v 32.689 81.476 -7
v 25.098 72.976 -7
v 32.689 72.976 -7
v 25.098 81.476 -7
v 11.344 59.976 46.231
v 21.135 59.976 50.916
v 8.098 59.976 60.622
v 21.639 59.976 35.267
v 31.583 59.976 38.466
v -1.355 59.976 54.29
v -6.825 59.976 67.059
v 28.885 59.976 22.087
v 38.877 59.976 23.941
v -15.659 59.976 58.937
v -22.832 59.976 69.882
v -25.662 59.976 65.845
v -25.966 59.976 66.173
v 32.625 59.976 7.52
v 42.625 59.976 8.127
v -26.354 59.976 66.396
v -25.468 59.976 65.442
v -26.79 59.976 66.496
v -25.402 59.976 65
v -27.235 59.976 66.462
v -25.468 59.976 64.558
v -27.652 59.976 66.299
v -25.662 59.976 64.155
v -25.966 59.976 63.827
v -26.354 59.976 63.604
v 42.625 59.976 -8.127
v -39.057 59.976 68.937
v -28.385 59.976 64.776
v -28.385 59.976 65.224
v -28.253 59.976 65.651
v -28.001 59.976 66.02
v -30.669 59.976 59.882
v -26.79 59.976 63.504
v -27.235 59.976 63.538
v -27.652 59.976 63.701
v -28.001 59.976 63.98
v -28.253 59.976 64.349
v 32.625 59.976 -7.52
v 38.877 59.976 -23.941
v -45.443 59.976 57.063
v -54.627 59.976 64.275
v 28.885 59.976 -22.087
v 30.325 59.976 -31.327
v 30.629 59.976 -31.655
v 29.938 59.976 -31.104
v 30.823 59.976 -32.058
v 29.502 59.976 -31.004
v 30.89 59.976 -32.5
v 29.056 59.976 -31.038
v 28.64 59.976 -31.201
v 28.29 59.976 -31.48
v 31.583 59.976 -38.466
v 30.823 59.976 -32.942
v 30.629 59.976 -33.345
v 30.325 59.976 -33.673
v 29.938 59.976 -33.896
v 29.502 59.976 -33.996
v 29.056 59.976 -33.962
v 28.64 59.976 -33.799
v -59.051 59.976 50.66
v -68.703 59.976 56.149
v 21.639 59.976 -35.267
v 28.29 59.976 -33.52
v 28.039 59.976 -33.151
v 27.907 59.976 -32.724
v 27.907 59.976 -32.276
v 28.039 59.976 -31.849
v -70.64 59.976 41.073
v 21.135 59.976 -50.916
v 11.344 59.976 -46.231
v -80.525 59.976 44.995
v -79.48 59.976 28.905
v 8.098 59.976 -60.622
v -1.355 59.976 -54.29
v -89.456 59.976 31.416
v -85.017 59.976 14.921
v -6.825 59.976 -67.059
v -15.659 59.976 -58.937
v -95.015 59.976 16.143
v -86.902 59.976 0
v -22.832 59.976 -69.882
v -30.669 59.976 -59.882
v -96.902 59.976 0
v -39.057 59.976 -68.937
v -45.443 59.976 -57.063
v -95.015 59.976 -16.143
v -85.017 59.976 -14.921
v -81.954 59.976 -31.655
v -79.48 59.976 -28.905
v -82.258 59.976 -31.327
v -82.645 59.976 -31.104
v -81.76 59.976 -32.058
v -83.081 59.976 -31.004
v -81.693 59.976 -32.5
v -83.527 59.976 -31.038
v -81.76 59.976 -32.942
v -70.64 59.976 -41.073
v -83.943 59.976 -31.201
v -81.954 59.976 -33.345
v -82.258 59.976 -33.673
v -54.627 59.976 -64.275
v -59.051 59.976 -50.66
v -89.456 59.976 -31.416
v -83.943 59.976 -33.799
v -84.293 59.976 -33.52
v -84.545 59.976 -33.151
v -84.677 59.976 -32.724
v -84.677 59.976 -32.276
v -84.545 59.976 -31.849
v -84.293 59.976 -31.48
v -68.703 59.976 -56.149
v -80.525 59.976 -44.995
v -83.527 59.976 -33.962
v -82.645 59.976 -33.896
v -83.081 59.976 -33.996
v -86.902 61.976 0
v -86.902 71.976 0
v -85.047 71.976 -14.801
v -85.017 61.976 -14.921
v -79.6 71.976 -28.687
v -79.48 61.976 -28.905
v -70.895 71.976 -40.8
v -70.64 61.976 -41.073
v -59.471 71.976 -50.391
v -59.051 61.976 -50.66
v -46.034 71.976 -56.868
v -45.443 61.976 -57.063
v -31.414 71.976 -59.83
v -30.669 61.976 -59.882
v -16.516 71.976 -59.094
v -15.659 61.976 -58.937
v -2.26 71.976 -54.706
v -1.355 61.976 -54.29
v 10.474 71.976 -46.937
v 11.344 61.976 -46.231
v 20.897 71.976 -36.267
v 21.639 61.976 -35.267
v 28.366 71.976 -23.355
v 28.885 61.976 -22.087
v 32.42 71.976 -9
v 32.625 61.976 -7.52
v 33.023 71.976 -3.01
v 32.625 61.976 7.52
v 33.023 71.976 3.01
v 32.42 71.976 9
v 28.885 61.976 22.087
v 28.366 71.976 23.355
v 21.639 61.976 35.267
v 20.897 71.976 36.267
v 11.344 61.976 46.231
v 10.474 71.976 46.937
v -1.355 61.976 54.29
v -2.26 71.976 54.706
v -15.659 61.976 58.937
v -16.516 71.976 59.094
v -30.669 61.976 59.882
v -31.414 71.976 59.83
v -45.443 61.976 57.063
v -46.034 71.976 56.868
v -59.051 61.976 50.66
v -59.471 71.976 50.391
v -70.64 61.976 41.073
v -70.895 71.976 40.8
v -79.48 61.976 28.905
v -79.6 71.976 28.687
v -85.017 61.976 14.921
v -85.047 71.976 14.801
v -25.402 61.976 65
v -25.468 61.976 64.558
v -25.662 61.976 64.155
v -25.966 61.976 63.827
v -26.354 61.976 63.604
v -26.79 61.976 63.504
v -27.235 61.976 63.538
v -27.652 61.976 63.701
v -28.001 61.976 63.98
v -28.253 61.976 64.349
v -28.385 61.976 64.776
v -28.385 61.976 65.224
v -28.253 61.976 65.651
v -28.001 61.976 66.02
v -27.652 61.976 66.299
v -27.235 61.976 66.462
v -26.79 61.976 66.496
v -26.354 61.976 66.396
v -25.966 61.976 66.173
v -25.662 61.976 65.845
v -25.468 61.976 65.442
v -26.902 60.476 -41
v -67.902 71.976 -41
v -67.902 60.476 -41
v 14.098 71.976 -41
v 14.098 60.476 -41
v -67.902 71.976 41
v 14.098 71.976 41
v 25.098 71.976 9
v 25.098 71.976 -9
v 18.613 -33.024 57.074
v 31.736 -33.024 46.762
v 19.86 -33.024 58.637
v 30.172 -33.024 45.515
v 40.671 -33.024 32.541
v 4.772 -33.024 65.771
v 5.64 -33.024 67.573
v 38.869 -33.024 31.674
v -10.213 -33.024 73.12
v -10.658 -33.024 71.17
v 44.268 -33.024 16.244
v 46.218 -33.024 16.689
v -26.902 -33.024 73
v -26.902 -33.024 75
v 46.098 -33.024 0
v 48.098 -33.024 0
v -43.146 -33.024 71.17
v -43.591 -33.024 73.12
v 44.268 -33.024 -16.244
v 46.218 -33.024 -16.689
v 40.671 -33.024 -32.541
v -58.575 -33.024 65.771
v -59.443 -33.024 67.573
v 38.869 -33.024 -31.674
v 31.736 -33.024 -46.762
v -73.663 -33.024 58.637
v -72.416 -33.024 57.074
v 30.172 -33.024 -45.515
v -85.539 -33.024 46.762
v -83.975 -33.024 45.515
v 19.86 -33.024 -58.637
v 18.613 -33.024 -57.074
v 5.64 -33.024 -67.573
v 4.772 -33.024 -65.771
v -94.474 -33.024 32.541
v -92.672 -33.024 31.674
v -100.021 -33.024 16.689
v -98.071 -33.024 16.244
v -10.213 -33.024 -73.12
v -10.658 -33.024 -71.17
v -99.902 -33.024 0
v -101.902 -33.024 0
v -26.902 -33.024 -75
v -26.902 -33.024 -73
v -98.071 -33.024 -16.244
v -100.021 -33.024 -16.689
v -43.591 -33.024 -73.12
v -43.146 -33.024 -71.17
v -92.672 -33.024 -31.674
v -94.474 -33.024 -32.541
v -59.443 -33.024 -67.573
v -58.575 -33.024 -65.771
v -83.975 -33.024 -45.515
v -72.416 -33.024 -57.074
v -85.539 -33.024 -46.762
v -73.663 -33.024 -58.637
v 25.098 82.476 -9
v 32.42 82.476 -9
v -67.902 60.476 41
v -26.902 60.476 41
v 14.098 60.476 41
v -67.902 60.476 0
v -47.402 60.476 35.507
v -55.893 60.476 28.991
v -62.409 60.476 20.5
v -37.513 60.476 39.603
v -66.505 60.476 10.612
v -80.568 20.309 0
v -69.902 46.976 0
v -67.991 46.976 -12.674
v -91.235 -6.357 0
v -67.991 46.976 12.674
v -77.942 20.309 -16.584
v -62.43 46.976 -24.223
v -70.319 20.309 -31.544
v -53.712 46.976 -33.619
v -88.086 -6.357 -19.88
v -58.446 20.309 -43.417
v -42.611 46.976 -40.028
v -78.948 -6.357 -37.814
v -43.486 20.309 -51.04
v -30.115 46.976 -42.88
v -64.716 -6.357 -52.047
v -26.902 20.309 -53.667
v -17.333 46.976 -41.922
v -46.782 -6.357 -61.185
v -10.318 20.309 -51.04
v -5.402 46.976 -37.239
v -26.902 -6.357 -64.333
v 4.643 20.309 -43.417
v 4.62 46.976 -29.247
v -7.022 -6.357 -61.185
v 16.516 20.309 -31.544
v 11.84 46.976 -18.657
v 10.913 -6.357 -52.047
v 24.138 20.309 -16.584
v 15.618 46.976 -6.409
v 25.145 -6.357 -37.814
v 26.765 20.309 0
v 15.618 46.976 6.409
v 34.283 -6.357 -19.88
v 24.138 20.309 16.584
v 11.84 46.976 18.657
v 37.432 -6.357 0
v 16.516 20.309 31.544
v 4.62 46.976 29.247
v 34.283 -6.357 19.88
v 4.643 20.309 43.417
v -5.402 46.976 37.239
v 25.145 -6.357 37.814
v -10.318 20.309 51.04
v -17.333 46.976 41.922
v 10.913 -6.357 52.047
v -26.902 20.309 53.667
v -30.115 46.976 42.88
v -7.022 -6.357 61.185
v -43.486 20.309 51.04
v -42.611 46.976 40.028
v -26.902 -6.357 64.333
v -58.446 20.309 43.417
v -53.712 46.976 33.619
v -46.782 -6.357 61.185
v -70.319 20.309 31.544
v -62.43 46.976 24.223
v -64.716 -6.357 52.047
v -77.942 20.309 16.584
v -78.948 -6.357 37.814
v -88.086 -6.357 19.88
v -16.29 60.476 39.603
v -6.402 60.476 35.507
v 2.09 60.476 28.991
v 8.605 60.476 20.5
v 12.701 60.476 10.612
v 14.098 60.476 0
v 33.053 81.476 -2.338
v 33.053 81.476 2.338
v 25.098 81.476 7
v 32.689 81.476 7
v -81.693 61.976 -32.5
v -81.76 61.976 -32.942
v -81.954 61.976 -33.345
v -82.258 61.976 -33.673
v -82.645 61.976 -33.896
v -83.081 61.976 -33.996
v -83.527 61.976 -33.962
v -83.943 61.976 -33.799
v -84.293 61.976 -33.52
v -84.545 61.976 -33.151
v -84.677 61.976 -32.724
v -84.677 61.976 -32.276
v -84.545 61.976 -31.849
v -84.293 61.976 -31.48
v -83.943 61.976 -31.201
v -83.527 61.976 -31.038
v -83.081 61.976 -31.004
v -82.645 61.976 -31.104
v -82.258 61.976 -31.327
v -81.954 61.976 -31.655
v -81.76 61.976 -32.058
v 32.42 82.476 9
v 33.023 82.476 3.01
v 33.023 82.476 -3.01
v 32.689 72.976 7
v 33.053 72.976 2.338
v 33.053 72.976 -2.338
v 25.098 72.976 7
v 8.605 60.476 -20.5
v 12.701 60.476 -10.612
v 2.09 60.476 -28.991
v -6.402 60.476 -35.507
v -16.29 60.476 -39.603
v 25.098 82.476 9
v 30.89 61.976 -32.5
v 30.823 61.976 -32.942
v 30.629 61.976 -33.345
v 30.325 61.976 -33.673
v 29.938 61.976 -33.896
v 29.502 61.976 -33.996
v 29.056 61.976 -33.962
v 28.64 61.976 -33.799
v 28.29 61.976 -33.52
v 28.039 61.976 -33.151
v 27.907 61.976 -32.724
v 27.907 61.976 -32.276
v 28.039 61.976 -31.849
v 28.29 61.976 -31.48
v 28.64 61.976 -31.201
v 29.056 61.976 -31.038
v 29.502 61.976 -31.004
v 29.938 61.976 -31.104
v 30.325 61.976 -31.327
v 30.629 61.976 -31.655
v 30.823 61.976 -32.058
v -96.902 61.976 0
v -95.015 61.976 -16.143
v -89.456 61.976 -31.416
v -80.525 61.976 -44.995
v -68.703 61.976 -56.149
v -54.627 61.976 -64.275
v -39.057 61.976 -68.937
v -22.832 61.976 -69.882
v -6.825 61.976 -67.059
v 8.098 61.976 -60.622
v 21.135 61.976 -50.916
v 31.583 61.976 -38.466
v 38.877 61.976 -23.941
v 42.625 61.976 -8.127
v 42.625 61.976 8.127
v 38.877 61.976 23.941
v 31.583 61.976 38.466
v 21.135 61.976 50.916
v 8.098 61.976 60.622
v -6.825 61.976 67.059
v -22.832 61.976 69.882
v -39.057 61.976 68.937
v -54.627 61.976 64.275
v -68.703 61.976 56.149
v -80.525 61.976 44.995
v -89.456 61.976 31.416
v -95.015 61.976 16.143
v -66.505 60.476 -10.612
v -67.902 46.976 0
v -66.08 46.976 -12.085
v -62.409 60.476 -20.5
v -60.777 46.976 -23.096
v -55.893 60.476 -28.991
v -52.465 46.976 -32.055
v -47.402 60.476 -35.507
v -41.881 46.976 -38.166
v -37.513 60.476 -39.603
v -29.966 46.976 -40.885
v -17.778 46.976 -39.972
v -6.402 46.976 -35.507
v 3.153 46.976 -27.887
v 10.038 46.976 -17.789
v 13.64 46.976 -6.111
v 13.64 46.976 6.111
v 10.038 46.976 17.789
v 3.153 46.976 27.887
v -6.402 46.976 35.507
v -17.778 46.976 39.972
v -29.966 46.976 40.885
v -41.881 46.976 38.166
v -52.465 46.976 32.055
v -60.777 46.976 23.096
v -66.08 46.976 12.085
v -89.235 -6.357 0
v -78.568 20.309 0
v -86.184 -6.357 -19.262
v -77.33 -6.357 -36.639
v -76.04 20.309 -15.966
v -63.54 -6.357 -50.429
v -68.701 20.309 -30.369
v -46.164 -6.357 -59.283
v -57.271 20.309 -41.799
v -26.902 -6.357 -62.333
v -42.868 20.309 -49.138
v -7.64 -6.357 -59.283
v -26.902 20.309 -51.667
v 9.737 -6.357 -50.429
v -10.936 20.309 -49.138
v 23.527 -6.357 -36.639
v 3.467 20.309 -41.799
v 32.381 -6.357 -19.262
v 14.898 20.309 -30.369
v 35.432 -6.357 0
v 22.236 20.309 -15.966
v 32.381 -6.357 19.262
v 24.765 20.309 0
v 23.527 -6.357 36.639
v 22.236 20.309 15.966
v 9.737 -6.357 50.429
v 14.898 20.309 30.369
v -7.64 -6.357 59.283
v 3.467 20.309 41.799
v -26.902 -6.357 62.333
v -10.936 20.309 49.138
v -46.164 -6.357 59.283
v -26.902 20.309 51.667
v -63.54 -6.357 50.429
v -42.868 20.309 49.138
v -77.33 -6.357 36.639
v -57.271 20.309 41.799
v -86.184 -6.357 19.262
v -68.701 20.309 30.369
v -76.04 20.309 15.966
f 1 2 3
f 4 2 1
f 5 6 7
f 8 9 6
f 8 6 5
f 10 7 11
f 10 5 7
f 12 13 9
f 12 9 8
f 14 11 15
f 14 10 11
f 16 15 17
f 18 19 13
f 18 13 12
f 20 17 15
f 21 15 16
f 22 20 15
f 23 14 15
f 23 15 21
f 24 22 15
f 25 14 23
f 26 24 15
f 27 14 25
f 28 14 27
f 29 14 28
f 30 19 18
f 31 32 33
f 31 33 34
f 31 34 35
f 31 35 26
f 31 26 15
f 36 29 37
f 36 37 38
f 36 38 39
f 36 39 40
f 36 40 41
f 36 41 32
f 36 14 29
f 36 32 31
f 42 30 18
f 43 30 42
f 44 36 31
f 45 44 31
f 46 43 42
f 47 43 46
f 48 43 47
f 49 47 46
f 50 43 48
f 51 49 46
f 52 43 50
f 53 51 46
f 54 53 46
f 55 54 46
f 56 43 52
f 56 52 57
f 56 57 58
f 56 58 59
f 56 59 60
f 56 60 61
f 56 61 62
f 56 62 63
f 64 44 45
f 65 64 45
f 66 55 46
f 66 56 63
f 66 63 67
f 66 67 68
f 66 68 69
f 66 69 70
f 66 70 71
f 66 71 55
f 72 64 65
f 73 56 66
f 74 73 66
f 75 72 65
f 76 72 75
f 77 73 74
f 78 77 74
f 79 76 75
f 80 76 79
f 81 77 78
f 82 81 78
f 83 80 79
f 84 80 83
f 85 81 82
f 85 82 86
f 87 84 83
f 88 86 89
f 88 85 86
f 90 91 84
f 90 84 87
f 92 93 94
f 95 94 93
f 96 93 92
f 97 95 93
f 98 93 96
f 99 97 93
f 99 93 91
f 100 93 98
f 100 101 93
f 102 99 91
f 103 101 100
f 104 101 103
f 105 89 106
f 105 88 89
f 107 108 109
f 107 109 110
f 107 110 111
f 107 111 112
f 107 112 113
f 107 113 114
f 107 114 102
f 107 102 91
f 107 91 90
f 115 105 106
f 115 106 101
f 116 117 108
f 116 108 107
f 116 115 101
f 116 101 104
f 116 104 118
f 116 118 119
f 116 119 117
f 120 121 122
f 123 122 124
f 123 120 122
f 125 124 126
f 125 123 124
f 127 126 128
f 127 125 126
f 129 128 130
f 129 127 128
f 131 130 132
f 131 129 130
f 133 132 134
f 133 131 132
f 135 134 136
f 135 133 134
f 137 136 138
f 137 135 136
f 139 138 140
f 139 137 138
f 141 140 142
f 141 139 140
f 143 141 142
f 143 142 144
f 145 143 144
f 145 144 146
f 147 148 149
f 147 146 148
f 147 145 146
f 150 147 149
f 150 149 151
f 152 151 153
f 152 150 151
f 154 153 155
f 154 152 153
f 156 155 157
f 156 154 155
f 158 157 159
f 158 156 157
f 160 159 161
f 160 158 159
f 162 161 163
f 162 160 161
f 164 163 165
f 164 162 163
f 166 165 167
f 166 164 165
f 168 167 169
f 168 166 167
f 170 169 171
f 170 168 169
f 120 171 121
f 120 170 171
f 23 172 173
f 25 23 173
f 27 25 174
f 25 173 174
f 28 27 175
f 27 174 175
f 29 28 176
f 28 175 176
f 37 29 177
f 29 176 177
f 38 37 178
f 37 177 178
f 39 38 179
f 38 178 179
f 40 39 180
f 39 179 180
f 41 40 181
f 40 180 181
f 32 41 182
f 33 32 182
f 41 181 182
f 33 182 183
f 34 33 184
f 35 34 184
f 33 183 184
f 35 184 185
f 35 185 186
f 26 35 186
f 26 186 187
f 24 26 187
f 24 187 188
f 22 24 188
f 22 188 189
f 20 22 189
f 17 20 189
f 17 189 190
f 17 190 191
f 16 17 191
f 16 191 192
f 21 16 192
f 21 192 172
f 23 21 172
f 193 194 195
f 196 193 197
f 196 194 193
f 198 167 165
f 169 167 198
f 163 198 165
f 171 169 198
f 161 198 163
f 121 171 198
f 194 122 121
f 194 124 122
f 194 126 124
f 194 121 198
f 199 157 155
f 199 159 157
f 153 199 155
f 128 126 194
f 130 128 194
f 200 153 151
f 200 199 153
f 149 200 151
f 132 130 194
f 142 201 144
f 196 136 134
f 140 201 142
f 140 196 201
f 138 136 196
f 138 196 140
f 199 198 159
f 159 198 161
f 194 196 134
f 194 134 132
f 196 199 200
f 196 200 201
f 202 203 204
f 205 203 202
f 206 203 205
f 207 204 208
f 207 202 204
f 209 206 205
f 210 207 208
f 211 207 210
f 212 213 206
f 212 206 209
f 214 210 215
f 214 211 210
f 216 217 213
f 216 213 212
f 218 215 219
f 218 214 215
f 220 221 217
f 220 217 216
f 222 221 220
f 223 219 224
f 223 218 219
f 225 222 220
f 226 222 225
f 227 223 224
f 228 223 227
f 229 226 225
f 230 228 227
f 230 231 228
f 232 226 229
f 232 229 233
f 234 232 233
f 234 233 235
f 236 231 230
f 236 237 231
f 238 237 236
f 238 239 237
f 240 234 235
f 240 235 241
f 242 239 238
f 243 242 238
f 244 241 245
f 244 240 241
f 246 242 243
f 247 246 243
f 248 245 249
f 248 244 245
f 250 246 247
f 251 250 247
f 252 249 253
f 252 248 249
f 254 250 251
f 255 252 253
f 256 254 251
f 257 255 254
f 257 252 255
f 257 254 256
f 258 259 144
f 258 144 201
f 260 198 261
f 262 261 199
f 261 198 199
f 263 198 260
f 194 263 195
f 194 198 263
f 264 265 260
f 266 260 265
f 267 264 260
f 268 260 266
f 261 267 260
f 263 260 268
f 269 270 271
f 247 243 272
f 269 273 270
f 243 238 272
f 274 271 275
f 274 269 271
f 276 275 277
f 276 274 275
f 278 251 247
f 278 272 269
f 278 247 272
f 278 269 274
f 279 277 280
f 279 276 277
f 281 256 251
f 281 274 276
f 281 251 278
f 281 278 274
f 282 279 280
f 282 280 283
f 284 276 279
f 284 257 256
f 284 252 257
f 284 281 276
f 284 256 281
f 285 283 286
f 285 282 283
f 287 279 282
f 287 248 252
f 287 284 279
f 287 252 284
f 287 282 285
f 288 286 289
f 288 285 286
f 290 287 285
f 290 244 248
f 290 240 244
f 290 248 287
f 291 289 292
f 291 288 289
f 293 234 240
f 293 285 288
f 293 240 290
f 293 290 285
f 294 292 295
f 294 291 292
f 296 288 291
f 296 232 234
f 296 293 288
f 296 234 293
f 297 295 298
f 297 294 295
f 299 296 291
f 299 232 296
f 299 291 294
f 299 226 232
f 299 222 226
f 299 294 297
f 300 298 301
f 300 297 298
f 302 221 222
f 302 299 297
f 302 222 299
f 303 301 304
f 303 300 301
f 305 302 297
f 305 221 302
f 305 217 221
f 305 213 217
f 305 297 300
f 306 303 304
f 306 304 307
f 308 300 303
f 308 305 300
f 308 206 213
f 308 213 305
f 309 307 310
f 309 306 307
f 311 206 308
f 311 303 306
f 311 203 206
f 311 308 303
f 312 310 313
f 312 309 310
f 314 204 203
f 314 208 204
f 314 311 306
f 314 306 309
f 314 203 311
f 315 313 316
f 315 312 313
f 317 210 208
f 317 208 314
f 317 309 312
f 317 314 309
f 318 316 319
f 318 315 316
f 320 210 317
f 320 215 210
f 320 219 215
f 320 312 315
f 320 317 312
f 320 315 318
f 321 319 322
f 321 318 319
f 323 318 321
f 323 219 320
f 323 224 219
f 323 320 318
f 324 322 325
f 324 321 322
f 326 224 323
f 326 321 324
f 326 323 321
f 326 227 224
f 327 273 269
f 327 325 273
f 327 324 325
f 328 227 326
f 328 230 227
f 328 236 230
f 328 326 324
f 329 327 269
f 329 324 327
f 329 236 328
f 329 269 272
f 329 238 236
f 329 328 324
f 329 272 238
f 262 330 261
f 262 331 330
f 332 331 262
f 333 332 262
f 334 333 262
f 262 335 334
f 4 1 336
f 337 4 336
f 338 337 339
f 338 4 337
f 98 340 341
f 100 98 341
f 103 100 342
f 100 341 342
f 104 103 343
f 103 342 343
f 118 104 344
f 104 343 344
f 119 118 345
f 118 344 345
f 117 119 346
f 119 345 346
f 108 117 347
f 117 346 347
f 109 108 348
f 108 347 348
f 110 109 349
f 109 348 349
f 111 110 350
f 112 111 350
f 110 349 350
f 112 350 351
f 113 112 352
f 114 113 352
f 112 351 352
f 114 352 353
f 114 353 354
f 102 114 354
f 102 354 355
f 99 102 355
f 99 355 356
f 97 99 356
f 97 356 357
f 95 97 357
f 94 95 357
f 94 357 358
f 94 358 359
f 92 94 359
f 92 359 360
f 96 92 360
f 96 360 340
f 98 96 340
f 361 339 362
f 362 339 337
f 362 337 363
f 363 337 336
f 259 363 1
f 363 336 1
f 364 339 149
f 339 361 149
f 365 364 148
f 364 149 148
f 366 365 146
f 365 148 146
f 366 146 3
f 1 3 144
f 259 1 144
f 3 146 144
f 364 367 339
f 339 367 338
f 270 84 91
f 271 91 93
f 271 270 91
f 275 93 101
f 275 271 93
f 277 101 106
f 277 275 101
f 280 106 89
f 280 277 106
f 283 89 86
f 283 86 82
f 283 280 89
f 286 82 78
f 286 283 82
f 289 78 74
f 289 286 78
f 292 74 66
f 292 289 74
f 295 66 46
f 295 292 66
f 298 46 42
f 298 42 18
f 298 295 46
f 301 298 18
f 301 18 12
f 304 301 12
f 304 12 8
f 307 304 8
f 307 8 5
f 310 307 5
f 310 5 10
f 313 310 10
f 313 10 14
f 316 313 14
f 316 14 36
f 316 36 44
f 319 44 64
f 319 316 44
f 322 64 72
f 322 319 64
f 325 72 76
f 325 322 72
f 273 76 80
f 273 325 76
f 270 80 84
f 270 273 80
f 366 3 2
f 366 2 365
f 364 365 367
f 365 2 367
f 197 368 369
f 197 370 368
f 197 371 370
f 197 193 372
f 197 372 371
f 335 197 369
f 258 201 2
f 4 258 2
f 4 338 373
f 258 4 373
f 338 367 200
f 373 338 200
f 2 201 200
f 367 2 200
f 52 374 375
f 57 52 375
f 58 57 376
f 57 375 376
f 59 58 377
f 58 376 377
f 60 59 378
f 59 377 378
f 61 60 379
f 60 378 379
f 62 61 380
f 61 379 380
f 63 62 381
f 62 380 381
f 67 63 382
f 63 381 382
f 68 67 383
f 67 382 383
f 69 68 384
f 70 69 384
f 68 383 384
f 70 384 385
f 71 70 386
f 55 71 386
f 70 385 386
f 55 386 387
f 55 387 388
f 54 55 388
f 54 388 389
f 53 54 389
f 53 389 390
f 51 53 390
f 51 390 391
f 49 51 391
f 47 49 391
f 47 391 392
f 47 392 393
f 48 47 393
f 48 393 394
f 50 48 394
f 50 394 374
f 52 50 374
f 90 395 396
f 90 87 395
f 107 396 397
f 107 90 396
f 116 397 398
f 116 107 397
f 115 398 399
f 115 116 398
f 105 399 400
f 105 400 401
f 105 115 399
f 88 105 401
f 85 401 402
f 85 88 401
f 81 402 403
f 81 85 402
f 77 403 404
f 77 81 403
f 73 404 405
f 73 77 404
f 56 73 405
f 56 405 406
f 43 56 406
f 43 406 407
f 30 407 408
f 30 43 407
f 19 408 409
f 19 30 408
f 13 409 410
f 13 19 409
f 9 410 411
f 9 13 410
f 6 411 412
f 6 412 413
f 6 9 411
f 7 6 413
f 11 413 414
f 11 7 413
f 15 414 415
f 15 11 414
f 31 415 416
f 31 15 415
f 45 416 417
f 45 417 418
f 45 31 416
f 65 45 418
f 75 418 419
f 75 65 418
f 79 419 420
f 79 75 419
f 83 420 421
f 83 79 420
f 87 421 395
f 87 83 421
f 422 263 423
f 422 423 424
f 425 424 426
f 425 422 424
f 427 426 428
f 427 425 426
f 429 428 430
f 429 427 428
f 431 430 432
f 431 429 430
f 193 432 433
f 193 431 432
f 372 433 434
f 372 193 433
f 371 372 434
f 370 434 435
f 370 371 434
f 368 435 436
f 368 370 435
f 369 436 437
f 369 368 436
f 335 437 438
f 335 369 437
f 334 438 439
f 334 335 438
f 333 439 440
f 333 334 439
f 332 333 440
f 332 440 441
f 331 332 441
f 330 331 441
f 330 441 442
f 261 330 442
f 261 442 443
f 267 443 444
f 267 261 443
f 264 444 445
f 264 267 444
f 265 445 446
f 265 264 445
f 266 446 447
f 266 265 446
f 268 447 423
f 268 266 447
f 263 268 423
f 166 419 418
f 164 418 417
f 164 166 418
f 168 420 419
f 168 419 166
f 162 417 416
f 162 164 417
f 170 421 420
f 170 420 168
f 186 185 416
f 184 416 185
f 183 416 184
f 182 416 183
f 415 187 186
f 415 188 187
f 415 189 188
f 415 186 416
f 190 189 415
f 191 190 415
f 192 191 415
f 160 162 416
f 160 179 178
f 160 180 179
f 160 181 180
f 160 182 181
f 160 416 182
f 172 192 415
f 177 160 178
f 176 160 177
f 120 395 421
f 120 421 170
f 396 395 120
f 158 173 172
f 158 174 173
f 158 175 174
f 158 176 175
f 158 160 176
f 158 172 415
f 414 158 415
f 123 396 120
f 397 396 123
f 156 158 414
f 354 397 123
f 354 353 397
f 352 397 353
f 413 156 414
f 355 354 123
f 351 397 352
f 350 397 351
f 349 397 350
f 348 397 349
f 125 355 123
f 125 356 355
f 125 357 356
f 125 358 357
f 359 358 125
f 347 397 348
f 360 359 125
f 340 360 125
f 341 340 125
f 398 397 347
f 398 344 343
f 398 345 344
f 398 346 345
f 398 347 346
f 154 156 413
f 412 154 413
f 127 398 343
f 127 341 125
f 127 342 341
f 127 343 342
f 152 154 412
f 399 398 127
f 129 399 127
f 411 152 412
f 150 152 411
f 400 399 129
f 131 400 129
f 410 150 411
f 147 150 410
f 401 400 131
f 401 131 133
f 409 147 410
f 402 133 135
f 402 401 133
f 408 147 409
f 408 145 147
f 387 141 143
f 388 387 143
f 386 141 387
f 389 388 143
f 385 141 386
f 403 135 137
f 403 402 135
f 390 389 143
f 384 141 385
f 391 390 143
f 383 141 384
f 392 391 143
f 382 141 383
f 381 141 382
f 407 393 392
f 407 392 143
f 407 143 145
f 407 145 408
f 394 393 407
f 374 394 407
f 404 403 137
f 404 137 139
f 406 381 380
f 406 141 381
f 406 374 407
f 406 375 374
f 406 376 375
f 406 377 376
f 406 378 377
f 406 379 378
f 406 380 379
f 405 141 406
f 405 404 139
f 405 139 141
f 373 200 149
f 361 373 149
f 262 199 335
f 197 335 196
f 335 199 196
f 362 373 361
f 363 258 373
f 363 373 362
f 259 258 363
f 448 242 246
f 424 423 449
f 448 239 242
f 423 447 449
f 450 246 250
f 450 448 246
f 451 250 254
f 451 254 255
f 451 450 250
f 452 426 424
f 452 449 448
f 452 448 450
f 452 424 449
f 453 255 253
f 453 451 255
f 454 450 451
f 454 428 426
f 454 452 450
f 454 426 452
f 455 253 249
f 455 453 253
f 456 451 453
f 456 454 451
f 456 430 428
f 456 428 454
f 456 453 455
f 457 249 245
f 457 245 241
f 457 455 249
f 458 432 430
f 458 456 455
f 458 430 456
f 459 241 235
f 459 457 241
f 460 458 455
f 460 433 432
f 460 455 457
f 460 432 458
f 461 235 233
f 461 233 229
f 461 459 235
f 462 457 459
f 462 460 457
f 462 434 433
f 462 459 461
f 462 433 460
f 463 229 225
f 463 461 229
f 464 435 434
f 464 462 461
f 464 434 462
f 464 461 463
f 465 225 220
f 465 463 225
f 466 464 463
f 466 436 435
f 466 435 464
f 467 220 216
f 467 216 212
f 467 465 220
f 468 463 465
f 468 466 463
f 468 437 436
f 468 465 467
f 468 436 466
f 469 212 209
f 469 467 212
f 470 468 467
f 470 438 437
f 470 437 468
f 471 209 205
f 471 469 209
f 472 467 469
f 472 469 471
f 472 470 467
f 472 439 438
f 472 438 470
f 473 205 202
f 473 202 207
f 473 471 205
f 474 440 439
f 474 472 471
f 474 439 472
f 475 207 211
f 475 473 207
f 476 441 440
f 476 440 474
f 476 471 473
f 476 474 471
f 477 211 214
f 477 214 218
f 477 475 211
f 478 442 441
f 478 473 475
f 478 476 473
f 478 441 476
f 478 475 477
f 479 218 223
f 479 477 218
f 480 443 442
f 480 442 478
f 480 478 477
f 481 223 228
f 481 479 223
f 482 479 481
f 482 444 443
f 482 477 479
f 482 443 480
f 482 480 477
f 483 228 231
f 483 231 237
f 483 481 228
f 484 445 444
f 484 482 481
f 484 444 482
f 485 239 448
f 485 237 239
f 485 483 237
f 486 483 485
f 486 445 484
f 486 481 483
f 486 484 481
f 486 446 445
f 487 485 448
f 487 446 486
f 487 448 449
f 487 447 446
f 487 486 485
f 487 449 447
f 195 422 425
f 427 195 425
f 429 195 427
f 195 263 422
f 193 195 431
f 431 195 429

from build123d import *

# Parameters (mm, degrees)
CROQUIS2_W              = 82
CROQUIS2_H              = 82
CORTAR_EXTRUIR1_DEPTH   = 11.5
SALIENTE_EXTRUIR1_DEPTH = 10.5
CROQUIS4_W              = 14
CROQUIS4_H              = 8.5
CORTAR_EXTRUIR2_DEPTH   = 10.5
CROQUIS5_R              = 1.5
CORTAR_EXTRUIR3_DEPTH   = 10


with BuildPart() as part:
    # Croquis1 → Revolución1 (revolve)
    with BuildSketch(Plane.XY):
        Polygon((-67.901642817, 46.97611702), (-67.901642817, 61.97611702), (-67.901642817, 71.97611702), (-86.901642817, 71.97611702), (-86.901642817, 61.97611702), (-96.901642817, 61.97611702), (-96.901642817, 59.97611702), (-86.901642817, 59.97611702), (-69.901642817, 46.97611702), (-101.901642817, -33.02388298), (-99.901642817, -33.02388298), align=None)
    revolve(axis=Axis((-26.901642817, 46.97611702, 0), (0, -1, 0)))

    # Croquis2 → Cortar-Extruir1 (cut)
    with BuildSketch(Plane(origin=(0, 71.97611702, 0), x_dir=(1, 0, 0), z_dir=(0, 1, 0))):
        with Locations((-26.901642817, 0)):
            Rectangle(CROQUIS2_W, CROQUIS2_H)
    extrude(amount=-CORTAR_EXTRUIR1_DEPTH, mode=Mode.SUBTRACT)

    # Croquis3 → Saliente-Extruir1 (add)
    with BuildSketch(Plane(origin=(0, 71.97611702, 0), x_dir=(1, 0, 0), z_dir=(0, 1, 0))):
        with BuildLine():
            Line((32.419516983, 9), (25.098357183, 9))
            Line((25.098357183, 9), (25.098357183, -9))
            Line((25.098357183, -9), (32.419516983, -9))
            ThreePointArc((32.419516983, -9), (33.098357183, 0), (32.419516983, 9))
        make_face()
    extrude(amount=SALIENTE_EXTRUIR1_DEPTH)

    # Croquis4 → Cortar-Extruir2 (cut)
    with BuildSketch(Plane.ZY.offset(-25.098357183)):
        with Locations((0, 77.22611702)):
            Rectangle(CROQUIS4_W, CROQUIS4_H)
    extrude(amount=-CORTAR_EXTRUIR2_DEPTH, mode=Mode.SUBTRACT)

    # Croquis5 → Cortar-Extruir3 (cut)
    with BuildSketch(Plane(origin=(0, 61.97611702, 0), x_dir=(1, 0, 0), z_dir=(0, 1, 0))):
        with Locations((-26.901642817, -65)):
            Circle(CROQUIS5_R)
        with Locations((-83.193294063, 32.5)):
            Circle(CROQUIS5_R)
        with Locations((29.390008429, 32.5)):
            Circle(CROQUIS5_R)
    extrude(amount=-CORTAR_EXTRUIR3_DEPTH, mode=Mode.SUBTRACT)


solid = part.part
